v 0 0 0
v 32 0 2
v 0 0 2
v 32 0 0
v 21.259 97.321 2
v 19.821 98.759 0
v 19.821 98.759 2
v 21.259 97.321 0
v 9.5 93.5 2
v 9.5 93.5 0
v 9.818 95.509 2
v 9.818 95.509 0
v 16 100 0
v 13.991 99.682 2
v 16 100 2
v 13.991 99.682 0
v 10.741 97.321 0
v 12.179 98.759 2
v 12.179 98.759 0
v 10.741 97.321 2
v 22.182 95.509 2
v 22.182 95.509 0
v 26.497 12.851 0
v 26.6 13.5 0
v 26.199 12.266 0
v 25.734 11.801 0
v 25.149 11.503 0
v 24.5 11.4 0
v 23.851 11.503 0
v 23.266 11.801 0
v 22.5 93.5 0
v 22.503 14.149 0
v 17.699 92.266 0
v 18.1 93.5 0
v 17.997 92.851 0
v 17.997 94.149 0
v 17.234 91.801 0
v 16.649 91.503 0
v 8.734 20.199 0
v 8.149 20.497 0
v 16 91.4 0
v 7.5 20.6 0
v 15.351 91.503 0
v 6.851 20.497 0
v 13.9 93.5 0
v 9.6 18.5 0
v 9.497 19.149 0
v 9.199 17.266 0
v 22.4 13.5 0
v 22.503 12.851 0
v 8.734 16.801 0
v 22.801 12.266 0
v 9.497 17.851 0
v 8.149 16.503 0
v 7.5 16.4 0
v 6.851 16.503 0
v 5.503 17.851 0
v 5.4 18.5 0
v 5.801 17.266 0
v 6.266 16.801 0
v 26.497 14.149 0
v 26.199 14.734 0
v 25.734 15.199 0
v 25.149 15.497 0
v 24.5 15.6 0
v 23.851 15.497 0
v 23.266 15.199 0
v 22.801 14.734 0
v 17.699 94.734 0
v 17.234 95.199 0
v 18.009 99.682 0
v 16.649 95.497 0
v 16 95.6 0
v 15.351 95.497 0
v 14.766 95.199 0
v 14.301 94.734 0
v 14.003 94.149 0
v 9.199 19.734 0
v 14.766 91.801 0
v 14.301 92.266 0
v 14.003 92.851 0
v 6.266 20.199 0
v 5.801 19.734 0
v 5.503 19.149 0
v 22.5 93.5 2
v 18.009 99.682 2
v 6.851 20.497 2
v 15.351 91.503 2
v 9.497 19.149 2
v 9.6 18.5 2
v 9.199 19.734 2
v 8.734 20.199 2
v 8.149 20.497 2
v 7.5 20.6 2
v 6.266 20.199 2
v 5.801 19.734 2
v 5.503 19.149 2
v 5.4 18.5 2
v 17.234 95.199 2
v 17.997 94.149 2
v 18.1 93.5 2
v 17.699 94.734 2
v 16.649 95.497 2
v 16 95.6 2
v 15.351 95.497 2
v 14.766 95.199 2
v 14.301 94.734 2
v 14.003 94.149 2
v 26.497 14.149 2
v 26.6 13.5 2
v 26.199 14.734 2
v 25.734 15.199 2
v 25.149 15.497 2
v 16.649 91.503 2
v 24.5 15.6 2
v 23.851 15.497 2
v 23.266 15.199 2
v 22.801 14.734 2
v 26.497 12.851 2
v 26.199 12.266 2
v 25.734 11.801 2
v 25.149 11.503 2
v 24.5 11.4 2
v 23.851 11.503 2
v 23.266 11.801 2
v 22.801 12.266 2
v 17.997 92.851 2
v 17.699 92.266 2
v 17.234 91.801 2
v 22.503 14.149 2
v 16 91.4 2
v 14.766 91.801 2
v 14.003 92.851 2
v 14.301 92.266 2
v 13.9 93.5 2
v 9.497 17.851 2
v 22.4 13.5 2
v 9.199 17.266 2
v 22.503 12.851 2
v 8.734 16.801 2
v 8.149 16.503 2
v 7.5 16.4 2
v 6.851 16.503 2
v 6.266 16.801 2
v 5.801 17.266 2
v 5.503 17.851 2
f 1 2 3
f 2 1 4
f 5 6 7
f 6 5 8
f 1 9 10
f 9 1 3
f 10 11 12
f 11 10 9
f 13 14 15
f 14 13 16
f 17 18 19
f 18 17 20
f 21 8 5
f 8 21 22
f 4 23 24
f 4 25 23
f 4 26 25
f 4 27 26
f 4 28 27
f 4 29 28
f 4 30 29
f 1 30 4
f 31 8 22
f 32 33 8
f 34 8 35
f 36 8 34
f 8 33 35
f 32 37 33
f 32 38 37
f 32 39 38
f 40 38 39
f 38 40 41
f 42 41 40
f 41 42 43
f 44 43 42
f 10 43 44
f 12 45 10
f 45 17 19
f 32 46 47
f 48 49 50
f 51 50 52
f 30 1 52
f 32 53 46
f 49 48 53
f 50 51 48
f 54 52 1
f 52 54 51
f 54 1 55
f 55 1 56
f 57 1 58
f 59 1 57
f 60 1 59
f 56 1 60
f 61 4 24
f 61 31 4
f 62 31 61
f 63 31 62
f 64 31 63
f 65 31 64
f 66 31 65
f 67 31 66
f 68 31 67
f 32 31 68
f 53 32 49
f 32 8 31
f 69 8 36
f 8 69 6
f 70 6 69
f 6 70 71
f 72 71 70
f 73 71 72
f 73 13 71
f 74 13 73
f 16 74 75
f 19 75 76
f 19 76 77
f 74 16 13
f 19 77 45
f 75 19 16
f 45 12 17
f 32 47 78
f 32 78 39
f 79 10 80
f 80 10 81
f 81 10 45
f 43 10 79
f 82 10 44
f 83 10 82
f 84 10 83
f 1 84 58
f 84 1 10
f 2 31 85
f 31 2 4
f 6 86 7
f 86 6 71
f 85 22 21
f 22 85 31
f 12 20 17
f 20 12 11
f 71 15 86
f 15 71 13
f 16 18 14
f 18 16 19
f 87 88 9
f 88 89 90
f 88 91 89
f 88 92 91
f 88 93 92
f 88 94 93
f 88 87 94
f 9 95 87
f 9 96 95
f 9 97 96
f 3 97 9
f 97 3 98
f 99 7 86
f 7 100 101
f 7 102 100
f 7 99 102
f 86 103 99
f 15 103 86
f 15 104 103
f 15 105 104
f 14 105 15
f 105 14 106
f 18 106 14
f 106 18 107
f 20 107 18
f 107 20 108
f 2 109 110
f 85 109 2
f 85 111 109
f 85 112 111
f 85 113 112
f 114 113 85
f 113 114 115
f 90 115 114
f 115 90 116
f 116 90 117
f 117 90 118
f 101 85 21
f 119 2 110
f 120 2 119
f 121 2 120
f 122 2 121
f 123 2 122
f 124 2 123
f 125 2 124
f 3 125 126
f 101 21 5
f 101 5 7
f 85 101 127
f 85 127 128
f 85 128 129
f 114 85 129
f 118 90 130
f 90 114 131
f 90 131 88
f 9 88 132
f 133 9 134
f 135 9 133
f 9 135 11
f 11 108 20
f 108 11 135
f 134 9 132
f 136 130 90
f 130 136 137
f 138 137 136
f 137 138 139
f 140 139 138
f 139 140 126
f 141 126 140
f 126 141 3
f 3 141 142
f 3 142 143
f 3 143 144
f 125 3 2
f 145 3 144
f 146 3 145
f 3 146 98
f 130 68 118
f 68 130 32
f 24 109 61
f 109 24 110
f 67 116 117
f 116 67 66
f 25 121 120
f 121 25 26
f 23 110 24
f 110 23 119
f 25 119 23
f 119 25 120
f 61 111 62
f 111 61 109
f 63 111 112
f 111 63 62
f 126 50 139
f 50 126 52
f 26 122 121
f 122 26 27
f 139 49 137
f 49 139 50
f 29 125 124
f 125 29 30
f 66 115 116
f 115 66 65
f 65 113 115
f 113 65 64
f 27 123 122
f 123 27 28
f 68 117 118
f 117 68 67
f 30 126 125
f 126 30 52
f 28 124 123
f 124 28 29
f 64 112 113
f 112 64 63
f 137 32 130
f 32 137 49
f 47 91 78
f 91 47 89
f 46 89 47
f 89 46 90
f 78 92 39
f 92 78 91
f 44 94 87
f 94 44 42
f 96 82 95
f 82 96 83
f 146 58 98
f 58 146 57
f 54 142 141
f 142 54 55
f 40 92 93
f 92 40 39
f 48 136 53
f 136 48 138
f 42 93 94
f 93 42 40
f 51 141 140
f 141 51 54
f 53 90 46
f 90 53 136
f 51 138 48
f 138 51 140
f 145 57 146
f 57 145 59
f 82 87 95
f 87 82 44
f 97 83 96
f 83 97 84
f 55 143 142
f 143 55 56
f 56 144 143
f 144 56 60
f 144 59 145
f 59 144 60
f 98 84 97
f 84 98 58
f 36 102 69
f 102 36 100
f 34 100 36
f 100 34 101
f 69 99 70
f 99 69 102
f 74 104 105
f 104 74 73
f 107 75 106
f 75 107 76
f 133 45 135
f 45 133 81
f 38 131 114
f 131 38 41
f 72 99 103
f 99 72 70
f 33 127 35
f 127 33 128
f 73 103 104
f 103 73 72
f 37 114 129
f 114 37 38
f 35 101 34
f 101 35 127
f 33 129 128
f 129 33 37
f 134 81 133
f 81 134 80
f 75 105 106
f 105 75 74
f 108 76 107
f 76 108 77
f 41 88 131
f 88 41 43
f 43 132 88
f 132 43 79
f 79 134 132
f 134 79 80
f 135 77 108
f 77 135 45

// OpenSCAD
// Overall length
length = 100;
// Width at the bottom
width1 = 32;
// Width at the top (diameter of circle at the end)
width2 = 13;
// Diameter of holes
hole_dia = 4.2;

// Offsets of the two lower holes downwardss relative to the top hole
offset1 = 80;
offset2 = 75;
// Offsets of the two lower holes out from the center.
center_offset_1 = 8.5;
center_offset_2 = 8.5;

// Thickness of the piece
thickness = 2;

difference() {
    $fn=20;
    top_hole_y = length - width2/2;
    linear_extrude(thickness) {
      polygon([[0, 0], [width1/2 - width2/2, length - width2/2], [width1/2+width2/2, length-width2/2], [width1, 0]]);
      translate([width1/2, length-width2/2,0])
        circle(d=width2);
    }
    translate([width1/2 + center_offset_2, top_hole_y - offset1, -1]) {
      cylinder(d=hole_dia, h=thickness+2);
    }
    translate([width1/2 - center_offset_1, top_hole_y - offset2, -1]) {
      cylinder(d=hole_dia, h=thickness+2);
    }
    translate([width1/2, top_hole_y, -1]) {
      cylinder(d=hole_dia, h=thickness+2);
    }
  }
